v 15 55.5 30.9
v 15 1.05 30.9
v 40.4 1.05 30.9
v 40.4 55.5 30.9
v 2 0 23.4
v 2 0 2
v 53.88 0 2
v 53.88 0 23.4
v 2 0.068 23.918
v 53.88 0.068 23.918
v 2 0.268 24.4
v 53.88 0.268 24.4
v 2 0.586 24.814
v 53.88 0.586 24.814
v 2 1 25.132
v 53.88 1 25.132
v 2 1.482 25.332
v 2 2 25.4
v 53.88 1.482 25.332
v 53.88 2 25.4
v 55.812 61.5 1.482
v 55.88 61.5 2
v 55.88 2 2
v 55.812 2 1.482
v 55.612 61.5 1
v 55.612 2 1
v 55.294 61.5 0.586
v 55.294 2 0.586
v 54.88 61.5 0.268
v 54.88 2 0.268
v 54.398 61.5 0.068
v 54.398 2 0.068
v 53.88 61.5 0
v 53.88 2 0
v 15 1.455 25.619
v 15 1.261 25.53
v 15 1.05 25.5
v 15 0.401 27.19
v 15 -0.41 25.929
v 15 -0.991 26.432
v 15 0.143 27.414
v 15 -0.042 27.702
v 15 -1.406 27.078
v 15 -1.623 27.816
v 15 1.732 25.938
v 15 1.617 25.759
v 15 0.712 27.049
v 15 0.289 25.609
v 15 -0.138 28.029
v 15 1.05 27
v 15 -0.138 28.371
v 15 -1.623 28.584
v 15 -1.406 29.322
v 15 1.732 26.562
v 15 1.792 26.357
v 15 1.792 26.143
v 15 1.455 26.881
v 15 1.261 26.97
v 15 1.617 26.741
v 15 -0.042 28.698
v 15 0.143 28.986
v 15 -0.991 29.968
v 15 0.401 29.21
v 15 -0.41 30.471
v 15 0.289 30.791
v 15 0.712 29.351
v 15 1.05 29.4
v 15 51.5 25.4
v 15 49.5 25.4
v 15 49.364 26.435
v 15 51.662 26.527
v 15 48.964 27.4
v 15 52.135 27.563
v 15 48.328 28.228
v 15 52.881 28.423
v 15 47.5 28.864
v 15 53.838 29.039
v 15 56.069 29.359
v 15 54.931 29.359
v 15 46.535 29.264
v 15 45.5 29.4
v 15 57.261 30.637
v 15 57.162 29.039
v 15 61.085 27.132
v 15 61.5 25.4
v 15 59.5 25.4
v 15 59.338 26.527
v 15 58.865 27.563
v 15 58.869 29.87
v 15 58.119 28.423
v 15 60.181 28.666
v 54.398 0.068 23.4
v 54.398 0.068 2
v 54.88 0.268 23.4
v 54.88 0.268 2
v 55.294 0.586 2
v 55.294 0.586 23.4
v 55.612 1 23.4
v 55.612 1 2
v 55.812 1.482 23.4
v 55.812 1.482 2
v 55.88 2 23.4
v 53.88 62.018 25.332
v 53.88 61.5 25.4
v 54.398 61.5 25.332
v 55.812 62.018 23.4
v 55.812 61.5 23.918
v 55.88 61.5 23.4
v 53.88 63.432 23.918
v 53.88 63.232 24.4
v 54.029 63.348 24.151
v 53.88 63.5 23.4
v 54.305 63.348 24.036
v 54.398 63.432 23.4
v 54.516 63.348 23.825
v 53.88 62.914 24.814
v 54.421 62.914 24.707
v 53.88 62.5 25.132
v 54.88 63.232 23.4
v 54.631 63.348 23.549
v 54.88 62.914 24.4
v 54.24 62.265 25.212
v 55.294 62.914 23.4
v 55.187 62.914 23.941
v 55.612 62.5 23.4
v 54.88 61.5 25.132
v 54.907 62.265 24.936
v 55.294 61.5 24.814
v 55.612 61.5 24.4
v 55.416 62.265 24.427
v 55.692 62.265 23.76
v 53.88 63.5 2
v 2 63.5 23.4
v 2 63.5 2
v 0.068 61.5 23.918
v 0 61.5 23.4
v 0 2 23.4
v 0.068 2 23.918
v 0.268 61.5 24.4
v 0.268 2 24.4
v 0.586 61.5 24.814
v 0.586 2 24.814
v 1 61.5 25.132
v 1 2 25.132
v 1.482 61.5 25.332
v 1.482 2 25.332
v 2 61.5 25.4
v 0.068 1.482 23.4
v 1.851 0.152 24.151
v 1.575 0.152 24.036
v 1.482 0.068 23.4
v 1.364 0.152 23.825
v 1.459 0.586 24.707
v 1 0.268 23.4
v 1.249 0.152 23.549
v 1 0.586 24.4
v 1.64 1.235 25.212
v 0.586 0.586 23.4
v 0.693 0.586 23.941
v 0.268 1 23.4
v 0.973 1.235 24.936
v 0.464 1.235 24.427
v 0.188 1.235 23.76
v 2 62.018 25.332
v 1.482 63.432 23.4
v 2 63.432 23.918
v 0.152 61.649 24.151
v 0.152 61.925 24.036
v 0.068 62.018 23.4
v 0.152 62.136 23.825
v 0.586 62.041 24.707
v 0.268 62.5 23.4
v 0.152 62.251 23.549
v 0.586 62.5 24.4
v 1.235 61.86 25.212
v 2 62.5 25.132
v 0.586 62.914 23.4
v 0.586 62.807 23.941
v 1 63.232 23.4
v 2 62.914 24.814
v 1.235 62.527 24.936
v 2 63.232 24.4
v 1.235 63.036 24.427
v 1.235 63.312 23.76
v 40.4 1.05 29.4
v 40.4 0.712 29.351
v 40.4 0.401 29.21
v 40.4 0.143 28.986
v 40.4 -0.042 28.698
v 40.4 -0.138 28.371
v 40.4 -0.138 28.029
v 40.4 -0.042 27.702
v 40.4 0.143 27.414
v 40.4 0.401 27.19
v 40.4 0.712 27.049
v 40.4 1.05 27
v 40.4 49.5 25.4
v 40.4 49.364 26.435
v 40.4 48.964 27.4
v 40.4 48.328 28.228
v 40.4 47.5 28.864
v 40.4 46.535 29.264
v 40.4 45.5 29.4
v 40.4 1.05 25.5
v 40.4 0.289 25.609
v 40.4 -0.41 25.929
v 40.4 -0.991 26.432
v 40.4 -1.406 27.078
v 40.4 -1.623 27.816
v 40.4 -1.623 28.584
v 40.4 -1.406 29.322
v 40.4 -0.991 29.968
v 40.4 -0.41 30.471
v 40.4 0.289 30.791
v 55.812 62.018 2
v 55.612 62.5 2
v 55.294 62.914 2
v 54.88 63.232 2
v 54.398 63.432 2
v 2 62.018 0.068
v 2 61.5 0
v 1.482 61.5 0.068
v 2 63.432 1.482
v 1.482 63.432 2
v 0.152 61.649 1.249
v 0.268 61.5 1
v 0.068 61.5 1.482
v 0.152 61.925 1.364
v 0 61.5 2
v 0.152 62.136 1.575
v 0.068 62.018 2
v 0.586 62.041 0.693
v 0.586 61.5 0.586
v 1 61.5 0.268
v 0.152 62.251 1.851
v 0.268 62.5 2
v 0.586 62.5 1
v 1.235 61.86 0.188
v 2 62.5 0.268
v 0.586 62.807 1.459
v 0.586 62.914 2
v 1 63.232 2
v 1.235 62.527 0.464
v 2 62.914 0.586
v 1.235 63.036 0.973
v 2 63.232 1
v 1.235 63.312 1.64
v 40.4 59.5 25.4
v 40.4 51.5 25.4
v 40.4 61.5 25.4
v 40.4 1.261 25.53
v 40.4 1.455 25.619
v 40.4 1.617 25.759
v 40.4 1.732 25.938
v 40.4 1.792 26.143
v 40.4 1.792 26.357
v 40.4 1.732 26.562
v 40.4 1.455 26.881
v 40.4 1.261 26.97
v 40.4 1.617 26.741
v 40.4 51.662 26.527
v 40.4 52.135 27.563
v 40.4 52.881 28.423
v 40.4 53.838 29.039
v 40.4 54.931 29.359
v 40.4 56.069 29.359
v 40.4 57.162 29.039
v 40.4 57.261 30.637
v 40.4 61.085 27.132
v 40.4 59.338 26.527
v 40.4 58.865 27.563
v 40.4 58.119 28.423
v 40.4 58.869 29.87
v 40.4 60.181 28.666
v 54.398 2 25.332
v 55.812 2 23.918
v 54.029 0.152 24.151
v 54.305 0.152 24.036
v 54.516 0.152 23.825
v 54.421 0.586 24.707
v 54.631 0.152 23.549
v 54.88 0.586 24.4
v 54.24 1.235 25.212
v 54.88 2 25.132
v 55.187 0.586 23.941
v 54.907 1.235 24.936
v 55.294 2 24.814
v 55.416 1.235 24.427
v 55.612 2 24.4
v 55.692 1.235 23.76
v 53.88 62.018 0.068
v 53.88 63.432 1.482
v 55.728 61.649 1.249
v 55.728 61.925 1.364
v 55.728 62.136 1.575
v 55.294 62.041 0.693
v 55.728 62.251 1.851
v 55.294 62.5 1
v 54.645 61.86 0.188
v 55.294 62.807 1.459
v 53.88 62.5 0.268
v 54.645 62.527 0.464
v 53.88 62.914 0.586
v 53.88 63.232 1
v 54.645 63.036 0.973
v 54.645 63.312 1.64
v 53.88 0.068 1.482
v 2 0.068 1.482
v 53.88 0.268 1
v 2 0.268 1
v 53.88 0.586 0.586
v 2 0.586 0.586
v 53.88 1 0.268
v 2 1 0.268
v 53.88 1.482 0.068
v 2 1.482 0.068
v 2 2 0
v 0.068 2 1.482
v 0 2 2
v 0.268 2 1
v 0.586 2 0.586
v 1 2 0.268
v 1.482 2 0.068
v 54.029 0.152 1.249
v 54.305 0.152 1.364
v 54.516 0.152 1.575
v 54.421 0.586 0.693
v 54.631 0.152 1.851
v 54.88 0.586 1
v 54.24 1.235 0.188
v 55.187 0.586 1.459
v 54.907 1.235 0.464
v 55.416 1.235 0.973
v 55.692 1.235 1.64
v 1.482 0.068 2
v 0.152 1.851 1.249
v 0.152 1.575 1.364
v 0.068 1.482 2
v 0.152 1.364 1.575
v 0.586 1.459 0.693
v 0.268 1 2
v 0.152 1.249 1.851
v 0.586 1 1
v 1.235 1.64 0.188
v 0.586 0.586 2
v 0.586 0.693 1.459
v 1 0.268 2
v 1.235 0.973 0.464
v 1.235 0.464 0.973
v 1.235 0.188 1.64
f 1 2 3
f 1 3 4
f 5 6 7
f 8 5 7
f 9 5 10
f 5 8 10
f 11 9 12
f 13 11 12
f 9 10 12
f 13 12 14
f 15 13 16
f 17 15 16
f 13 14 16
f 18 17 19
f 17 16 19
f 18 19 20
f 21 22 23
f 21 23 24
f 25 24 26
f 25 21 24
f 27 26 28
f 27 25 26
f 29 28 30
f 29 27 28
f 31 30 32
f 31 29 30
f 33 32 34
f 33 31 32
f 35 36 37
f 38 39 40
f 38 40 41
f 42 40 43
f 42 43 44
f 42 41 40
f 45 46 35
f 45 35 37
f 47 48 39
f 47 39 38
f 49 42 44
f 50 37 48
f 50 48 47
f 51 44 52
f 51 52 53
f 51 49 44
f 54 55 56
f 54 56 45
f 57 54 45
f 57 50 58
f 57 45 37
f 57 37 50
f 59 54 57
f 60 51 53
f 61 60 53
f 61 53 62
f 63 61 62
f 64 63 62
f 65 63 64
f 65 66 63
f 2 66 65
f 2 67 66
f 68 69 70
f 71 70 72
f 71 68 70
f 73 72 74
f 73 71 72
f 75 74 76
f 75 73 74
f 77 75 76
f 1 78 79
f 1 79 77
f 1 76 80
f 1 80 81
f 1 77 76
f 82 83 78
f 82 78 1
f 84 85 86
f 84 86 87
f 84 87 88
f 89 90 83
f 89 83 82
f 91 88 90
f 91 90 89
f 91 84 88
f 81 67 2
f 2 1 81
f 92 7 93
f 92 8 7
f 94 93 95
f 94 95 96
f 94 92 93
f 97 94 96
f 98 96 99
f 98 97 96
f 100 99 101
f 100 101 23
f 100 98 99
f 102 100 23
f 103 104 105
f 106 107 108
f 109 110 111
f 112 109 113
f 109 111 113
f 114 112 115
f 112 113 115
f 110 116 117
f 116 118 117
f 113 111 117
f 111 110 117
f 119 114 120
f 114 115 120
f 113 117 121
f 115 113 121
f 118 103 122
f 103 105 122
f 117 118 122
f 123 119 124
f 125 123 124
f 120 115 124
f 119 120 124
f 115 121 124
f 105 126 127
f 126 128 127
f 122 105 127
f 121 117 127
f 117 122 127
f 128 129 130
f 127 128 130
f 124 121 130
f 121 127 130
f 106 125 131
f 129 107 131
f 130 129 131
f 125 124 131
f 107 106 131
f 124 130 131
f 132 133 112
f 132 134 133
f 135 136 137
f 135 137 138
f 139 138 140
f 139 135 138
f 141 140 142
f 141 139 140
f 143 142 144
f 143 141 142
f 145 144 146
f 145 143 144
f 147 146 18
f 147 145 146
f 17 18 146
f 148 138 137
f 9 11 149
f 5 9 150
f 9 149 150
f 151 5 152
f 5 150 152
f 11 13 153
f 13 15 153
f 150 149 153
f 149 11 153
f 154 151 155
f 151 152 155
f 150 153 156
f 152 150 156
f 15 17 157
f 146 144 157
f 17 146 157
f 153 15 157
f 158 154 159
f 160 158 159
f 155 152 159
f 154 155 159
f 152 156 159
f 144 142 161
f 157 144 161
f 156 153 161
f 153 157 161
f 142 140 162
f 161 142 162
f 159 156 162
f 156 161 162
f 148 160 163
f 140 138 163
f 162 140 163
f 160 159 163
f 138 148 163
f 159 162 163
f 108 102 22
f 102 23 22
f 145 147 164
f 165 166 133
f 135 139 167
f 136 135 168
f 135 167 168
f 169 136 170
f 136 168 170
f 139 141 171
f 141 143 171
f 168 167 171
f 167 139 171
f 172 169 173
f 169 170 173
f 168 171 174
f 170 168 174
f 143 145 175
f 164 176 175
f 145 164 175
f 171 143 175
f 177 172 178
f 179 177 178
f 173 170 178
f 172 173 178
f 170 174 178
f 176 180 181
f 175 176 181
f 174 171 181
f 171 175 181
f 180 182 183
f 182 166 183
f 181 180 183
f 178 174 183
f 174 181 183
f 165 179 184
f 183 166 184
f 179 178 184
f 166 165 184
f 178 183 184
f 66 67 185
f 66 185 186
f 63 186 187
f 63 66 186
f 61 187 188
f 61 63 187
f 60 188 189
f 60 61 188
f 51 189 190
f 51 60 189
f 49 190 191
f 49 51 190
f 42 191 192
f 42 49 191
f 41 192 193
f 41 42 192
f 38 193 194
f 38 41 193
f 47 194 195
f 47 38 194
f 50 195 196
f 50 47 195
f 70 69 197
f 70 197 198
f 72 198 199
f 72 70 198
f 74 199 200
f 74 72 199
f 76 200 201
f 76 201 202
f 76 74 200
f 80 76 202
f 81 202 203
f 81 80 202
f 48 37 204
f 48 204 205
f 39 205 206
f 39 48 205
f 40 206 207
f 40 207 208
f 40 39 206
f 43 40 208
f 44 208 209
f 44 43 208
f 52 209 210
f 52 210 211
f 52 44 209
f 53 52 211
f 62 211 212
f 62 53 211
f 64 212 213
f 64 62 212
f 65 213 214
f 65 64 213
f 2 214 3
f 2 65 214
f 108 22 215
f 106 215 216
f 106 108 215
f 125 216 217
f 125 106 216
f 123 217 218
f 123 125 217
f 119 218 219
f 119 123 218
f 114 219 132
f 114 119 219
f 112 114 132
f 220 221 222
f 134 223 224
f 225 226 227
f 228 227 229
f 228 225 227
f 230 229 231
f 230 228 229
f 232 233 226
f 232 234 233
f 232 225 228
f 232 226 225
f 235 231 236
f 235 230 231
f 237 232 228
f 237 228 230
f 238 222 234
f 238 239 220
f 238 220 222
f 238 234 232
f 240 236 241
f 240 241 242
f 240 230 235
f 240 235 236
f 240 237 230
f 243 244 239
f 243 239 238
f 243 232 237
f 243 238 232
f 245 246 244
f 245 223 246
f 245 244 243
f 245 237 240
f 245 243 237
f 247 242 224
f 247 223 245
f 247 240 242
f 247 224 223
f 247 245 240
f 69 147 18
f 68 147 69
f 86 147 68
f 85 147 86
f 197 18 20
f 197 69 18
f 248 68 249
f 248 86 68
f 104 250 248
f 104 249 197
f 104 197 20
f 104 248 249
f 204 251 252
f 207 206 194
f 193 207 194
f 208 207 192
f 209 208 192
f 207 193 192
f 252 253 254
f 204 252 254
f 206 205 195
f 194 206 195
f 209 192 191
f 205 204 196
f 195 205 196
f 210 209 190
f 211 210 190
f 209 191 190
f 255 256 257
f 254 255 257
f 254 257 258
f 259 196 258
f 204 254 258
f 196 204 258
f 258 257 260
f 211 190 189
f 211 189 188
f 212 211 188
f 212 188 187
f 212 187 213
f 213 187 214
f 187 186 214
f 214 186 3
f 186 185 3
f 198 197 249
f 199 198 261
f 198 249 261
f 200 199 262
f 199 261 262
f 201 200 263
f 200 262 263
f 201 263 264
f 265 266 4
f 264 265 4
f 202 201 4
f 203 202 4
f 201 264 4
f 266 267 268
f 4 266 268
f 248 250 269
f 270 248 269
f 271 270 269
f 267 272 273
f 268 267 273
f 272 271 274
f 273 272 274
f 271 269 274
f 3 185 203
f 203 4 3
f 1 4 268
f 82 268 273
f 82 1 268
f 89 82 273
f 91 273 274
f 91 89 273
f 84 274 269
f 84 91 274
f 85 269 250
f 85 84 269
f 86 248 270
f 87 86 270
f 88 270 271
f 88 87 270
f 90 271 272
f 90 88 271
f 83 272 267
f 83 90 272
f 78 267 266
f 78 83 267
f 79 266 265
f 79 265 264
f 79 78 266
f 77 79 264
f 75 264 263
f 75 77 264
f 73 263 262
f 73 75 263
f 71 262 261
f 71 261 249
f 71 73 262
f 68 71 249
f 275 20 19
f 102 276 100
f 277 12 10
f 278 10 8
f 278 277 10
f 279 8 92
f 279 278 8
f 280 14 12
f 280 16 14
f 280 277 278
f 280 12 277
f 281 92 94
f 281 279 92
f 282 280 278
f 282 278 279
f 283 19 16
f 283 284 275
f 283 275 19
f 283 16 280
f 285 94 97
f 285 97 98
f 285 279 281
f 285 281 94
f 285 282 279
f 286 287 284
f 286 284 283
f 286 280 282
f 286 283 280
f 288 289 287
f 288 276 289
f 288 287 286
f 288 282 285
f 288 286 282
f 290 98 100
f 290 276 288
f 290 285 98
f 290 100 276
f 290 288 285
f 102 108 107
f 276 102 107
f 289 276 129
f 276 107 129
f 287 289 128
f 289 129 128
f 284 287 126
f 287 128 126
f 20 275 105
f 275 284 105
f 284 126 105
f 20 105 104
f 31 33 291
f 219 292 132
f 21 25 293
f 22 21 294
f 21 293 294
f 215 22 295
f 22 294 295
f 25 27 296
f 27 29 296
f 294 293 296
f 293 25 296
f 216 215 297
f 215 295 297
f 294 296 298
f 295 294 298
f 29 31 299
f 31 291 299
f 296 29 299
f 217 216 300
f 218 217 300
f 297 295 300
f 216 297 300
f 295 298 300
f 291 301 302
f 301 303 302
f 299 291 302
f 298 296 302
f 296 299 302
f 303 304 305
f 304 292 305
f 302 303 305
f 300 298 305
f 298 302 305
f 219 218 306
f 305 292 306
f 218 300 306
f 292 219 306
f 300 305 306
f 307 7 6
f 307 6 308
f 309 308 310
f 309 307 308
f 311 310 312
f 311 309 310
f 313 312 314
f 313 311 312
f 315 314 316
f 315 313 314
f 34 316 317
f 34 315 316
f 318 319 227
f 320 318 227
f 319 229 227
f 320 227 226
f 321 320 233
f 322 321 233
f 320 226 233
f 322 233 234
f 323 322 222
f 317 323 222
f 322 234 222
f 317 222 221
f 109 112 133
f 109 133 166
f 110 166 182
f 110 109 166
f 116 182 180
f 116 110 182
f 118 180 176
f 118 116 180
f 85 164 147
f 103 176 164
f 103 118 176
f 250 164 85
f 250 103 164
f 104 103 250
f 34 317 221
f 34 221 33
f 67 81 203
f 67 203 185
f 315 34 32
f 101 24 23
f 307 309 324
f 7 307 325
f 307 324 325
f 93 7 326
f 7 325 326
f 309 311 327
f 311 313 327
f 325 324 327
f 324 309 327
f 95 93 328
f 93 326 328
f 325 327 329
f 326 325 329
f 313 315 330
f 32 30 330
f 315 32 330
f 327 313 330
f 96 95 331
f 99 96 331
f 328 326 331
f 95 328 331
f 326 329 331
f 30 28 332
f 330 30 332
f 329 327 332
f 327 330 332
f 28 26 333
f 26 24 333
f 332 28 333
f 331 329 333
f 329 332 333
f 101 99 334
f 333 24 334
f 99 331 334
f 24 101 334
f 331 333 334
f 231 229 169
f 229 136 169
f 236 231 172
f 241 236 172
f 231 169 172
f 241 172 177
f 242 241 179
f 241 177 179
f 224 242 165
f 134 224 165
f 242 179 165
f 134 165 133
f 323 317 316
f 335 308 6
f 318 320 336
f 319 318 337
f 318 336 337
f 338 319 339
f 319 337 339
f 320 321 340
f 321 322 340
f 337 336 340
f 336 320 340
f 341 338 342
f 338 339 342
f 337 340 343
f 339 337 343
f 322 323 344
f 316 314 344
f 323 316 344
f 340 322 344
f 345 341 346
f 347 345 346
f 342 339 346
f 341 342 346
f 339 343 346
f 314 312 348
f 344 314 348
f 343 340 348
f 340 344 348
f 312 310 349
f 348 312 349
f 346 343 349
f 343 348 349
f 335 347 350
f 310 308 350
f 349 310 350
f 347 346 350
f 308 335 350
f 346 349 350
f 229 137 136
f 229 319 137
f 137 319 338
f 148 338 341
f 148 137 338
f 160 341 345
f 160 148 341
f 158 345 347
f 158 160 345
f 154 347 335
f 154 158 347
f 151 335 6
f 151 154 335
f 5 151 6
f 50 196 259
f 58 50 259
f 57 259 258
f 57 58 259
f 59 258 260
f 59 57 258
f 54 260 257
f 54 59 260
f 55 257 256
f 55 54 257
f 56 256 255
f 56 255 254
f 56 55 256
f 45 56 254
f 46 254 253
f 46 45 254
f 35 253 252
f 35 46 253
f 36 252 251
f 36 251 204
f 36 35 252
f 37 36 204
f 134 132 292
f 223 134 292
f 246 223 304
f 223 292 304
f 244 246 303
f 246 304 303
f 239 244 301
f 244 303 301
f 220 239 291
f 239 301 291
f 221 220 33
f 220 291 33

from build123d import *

# Parameters (mm, degrees)
SKETCH1_W           = 55.88
SKETCH1_H           = 63.5
BOSS_EXTRUDE1_DEPTH = 25.4
FILLET1_R           = 2
BOSS_EXTRUDE2_DEPTH = 25.4


with BuildPart() as part:
    # Sketch1 → Boss-Extrude1 (new body)
    with BuildSketch(Plane.XY):
        with Locations((27.94, 31.75)):
            Rectangle(SKETCH1_W, SKETCH1_H)
    extrude(amount=BOSS_EXTRUDE1_DEPTH)

    # Fillet1
    fillet1_edges = [part.edges().sort_by_distance(p)[0] for p in [
        (55.88, 31.75, 25.4),
        (27.94, 63.5, 25.4),
        (0, 31.75, 25.4),
        (27.94, 63.5, 0),
        (55.88, 31.75, 0),
        (27.94, 0, 0),
        (0, 31.75, 0),
        (27.94, 0, 25.4),
        (0, 63.5, 12.7),
        (55.88, 63.5, 12.7),
        (55.88, 0, 12.7),
        (0, 0, 12.7),
    ]]
    fillet(fillet1_edges, radius=FILLET1_R)

    # Sketch3 → Boss-Extrude2 (add)
    with BuildSketch(Plane.ZY.offset(-15)):
        with BuildLine():
            Line((25.4, 61.5), (25.4, 59.5))
            ThreePointArc((25.4, 59.5), (29.4, 55.5), (25.4, 51.5))
            Line((25.4, 51.5), (25.4, 49.5))
            ThreePointArc((25.4, 49.5), (28.228427125, 48.328427125), (29.4, 45.5))
            Line((29.4, 45.5), (29.4, 1.05))
            ThreePointArc((29.4, 1.05), (28.2, -0.15), (27, 1.05))
            ThreePointArc((27, 1.05), (26.25, 1.8), (25.5, 1.05))
            ThreePointArc((25.5, 1.05), (28.2, -1.65), (30.9, 1.05))
            Line((30.9, 1.05), (30.9, 55.5))
            ThreePointArc((30.9, 55.5), (29.316951072, 59.569705149), (25.4, 61.5))
        make_face()
    extrude(amount=-BOSS_EXTRUDE2_DEPTH)


solid = part.part
